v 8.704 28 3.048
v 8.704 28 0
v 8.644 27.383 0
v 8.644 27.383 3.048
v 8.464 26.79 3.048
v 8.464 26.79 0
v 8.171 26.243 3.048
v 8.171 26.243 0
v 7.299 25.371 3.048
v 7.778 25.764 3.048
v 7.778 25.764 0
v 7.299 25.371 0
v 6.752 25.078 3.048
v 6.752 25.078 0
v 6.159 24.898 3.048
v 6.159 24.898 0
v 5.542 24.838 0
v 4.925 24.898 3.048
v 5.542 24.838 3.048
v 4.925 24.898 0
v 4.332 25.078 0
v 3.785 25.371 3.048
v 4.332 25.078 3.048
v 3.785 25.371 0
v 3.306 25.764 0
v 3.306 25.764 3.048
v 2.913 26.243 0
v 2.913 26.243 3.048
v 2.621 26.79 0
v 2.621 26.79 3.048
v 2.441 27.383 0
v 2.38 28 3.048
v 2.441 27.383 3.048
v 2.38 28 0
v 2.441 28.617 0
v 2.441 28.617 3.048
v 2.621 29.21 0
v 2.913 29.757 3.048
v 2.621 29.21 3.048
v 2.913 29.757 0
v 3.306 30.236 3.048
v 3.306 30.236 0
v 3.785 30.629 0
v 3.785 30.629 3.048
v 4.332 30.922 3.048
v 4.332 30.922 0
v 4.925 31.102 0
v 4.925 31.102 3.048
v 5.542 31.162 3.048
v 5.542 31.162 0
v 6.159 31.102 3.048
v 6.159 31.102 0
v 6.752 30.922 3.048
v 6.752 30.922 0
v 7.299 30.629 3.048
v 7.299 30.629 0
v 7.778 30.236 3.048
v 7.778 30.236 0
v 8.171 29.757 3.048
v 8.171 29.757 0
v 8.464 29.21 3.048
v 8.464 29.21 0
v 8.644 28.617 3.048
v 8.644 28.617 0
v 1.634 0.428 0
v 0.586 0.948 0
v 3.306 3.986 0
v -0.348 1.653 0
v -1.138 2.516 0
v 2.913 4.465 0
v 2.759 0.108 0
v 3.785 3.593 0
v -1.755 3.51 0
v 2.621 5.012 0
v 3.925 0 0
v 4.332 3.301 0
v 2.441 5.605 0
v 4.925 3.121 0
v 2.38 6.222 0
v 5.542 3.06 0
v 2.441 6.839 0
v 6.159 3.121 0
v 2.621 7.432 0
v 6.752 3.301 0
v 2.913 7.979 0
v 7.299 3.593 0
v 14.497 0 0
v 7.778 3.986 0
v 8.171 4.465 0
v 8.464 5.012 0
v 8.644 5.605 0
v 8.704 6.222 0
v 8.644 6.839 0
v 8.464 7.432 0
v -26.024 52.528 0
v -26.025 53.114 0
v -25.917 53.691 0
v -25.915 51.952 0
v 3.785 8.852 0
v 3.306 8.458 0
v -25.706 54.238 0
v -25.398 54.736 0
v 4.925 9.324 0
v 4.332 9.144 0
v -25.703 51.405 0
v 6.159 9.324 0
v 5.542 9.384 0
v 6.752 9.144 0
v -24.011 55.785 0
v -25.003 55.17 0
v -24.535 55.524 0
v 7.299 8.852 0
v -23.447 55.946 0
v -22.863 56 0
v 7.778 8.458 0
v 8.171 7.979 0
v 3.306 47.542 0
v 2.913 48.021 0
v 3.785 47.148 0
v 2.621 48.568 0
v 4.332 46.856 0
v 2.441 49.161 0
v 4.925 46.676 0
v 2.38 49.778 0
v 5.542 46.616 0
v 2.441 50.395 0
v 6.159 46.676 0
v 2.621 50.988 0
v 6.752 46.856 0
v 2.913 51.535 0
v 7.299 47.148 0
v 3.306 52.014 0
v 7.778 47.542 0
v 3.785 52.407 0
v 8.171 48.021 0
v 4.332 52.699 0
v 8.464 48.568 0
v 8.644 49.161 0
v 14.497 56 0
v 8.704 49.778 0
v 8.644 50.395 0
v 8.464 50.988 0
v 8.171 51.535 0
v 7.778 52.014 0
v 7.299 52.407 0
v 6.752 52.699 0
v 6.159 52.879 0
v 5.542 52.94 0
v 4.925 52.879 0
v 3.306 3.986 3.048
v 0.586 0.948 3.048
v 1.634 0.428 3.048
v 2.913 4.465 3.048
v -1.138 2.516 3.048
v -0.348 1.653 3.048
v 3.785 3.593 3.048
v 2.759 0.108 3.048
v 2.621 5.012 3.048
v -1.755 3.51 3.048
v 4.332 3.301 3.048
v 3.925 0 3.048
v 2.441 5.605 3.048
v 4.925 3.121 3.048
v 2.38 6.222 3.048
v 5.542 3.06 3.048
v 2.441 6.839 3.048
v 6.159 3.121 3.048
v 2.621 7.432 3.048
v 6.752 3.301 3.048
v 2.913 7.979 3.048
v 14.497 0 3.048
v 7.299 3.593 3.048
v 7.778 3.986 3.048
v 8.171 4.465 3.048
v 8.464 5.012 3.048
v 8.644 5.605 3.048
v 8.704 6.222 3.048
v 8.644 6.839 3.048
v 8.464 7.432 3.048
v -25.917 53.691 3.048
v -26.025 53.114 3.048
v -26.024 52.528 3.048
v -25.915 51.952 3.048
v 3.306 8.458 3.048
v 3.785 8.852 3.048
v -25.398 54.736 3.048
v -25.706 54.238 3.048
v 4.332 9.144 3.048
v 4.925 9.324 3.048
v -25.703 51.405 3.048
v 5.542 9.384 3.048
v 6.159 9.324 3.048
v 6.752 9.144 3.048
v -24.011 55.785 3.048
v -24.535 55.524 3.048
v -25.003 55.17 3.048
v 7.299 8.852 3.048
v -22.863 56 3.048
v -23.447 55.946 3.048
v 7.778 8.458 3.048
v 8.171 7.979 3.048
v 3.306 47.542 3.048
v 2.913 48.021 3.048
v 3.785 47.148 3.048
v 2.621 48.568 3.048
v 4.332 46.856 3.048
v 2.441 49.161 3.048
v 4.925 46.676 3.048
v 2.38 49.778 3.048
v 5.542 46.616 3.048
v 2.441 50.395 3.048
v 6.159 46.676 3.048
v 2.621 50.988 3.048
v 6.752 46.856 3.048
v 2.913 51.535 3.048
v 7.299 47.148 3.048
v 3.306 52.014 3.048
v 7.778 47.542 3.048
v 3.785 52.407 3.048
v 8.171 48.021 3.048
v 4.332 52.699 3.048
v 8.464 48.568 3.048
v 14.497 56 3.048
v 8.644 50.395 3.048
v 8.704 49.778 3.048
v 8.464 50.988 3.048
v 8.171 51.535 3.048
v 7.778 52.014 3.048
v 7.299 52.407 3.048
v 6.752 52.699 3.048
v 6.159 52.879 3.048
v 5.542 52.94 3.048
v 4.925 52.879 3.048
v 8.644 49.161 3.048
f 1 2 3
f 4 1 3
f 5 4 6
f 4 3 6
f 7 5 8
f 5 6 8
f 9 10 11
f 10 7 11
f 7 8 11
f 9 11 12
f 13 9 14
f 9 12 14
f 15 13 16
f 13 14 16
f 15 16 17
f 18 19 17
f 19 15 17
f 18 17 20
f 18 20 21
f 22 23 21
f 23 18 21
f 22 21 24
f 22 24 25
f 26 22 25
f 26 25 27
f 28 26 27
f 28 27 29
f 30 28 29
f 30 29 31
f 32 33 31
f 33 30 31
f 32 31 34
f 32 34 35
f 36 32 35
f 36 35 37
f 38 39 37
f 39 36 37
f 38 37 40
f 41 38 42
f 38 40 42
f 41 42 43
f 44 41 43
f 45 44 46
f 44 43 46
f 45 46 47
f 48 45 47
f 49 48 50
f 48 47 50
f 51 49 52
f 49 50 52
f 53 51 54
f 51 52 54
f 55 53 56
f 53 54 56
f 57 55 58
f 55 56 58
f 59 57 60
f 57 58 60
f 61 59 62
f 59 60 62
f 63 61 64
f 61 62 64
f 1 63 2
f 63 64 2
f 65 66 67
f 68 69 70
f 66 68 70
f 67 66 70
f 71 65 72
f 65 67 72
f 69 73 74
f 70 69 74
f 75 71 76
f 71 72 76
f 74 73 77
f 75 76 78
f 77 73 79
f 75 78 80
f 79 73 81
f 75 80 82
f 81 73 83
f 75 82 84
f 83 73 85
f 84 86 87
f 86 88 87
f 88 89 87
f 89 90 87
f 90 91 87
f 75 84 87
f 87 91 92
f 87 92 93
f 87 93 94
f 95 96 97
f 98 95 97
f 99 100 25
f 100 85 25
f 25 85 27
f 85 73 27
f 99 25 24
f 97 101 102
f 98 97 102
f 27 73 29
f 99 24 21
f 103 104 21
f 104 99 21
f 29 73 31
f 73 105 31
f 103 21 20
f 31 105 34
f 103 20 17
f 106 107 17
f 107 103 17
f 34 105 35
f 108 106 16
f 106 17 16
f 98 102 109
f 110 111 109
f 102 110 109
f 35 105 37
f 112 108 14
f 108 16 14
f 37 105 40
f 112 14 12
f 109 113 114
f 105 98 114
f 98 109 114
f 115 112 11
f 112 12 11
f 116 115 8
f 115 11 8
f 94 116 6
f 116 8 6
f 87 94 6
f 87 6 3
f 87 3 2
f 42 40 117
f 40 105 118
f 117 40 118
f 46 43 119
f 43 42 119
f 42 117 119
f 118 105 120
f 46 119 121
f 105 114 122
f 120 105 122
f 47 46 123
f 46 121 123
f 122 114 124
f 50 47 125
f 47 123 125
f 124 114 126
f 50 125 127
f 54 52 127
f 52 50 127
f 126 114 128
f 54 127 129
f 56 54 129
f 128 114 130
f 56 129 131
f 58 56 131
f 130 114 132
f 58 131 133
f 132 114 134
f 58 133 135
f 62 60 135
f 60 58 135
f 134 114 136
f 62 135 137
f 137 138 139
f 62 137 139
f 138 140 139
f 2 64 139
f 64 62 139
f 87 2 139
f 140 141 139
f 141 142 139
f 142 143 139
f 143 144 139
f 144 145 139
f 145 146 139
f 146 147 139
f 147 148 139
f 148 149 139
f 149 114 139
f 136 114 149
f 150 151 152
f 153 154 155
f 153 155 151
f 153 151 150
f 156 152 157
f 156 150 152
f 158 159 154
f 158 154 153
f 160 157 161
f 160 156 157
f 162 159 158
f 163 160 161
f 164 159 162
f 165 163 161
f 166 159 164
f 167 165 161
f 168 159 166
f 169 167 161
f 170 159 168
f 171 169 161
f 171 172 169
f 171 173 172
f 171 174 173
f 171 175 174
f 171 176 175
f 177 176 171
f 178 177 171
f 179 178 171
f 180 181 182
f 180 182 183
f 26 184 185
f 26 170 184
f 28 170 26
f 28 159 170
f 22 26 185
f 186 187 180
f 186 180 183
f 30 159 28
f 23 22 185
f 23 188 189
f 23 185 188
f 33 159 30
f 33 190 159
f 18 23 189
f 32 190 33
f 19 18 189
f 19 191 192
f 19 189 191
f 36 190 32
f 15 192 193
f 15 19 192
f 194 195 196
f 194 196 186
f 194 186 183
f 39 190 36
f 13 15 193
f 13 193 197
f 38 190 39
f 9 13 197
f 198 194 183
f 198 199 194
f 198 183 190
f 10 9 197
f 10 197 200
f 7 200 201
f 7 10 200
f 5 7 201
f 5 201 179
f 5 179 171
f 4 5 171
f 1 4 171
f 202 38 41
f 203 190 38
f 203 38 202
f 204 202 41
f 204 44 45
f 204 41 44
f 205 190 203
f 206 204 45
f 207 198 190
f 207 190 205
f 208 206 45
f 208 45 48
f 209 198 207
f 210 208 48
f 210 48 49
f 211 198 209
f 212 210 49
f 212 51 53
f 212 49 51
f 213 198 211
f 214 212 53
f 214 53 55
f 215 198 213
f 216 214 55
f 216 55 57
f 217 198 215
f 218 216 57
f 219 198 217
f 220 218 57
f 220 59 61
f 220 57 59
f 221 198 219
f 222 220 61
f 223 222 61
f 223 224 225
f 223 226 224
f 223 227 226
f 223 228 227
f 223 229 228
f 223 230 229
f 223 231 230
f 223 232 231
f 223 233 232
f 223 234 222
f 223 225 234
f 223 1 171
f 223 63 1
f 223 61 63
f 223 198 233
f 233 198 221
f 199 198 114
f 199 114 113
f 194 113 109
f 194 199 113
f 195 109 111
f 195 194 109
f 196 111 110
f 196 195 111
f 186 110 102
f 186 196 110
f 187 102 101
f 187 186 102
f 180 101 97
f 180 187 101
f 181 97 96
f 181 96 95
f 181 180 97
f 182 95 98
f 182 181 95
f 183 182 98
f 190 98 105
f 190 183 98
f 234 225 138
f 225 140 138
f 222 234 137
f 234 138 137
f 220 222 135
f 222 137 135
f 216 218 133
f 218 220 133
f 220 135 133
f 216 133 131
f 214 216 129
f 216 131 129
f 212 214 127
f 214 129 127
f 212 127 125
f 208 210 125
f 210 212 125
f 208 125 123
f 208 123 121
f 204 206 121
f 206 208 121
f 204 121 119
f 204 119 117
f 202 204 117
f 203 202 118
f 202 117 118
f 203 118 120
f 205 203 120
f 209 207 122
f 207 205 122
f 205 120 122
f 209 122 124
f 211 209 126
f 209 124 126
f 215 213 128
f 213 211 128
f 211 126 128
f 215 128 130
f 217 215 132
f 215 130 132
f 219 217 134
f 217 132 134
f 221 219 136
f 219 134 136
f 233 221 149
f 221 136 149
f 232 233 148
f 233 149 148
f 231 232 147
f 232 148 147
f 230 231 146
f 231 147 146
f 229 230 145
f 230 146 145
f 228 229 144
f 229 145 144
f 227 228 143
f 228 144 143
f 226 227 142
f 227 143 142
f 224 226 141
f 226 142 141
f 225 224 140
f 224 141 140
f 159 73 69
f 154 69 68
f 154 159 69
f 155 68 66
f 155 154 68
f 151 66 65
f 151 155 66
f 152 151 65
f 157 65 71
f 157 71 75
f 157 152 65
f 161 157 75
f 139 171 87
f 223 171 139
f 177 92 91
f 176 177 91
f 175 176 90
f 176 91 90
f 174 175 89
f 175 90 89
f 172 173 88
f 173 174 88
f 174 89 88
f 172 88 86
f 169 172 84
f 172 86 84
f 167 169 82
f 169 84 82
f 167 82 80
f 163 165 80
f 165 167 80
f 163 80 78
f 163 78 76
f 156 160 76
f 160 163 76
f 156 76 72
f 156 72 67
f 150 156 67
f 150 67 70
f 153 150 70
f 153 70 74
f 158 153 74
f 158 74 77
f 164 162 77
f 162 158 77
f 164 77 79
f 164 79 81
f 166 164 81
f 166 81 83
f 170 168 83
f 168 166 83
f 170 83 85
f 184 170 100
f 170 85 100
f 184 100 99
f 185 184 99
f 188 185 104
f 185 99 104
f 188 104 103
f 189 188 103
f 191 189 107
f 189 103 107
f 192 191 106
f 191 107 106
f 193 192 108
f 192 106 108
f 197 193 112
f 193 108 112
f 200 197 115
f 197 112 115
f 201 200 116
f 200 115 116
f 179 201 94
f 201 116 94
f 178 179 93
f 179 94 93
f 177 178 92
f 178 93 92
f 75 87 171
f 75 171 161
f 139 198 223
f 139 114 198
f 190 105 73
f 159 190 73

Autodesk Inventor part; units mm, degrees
ref_plane "YZ Plane" through (0, 0, 0) normal (1, 0, 0) x (0, 1, 0)
ref_plane "XZ Plane" through (0, 0, 0) normal (0, 1, 0) x (-1, 0, 0)
ref_plane "XY Plane" through (0, 0, 0) normal (0, 0, 1) x (1, 0, 0)
sketch "Sketch1" plane through (0, 0, 0) normal (0, 0, 1) x (1, 0, 0)
  line L0 (-50.8, 101.6) -> (101.6, 101.6)
  line L1 (50.8, 0) -> (101.6, 101.6)
  line L2 (-28, 56) -> (0, 0)
  line L3 (14.6239, 7) -> (34.6239, 7)
  line L4 (34.6239, 7) -> (34.6239, 2)
  line L5 (34.6239, 2) -> (14.6239, 2)
  line L6 (14.6239, 2) -> (14.6239, 7)
  line L7 (50.8, 0) -> (50.8, 62.4863)
  line L8 (14.6239, 14) -> (34.6239, 14)
  line L9 (34.6239, 14) -> (34.6239, 9)
  line L10 (34.6239, 9) -> (14.6239, 9)
  line L11 (14.6239, 9) -> (14.6239, 14)
  line L12 (14.6239, 21) -> (34.6239, 21)
  line L13 (34.6239, 21) -> (34.6239, 16)
  line L14 (34.6239, 16) -> (14.6239, 16)
  line L15 (14.6239, 16) -> (14.6239, 21)
  line L16 (14.6239, 28) -> (34.6239, 28)
  line L17 (34.6239, 28) -> (34.6239, 23)
  line L18 (34.6239, 23) -> (14.6239, 23)
  line L19 (14.6239, 23) -> (14.6239, 28)
  line L20 (14.6239, 35) -> (34.6239, 35)
  line L21 (34.6239, 35) -> (34.6239, 30)
  line L22 (34.6239, 30) -> (14.6239, 30)
  line L23 (14.6239, 30) -> (14.6239, 35)
  line L24 (14.6239, 42) -> (34.6239, 42)
  line L25 (34.6239, 42) -> (34.6239, 37)
  line L26 (34.6239, 37) -> (14.6239, 37)
  line L27 (14.6239, 37) -> (14.6239, 42)
  circle A0 centre (43.7057, 6.2222) radius 3.1623
  circle A1 centre (43.7057, 28) radius 3.1623
  circle A2 centre (43.7057, 49.7778) radius 3.1623
  line L28 (24.6239, 0) -> (24.6239, -15.6085)
  circle A3 centre (5.5421, 49.7778) radius 3.1623
  circle A4 centre (5.5421, 6.2222) radius 3.1623
  circle A5 centre (5.5421, 28) radius 3.1623
  line L29 (34.6239, 44) -> (14.6239, 44)
  line L30 (14.6239, 44) -> (14.6239, 49)
  line L31 (34.6239, 49) -> (34.6239, 44)
  line L32 (14.6239, 49) -> (34.6239, 49)
  line L33 (34.6239, 51) -> (14.6239, 51)
  line L34 (14.6239, 51) -> (14.6239, 56)
  line L35 (14.6239, 56) -> (34.6239, 56)
  line L36 (34.6239, 56) -> (34.6239, 51)
  circle A6 centre (-34.29, 91.44) radius 3.1623
  circle A7 centre (85.09, 91.44) radius 3.1623
  line L37 (14.6239, 0) -> (-28, 0)
  line L38 (-28, 0) -> (-28, 56)
  line L39 (-28, 56) -> (14.6239, 56)
  line L40 (14.6239, 56) -> (14.6239, 0)
  line L41 (-28, 56) -> (0, 0)
  line L42 (-28, 56) -> (14.6239, 56)
  line L43 (14.6239, 56) -> (14.6239, 0)
  line L44 (14.6239, 0) -> (0, 0)
  line L45 (0, 0) -> (14.6239, 0)
  line L46 (34.6239, 0) -> (50.8, 0)
  dimension "d8" = 50.8
  dimension "d9" = 152.4
  dimension "d11" = 50.8
  dimension "d12" = 20
  dimension "d13" = 5
  dimension "d15" = 7
  dimension "d16" = 6.3246
  dimension "d17" = 6.3246
  dimension "d18" = 6.3246
  dimension "d19" = 14
  dimension "d21" = 6.2222
  dimension "d24" = 6.3246
  dimension "d25" = 6.3246
  dimension "d26" = 34.29
  dimension "d27" = 34.29
  dimension "d28" = 10.16
  dimension "d29" = 10.16
  dimension "d40" = 9.0818
  dimension "d41" = 9.0818
  dimension "d42" = 9.0818
  dimension "d43" = 9.0818
  dimension "d44" = 9.0818
  dimension "d45" = 9.0818
  dimension "d46" = 26.1761
extrude "Plate1" add sketch "Sketch1" along normal blind 3.048 contours L39 L34 L40 L30 L27 L23 L19 L15 L11 L6 L37 L2
sketch "Sketch2" plane through (0, 0, 3.048) normal (0, 0, 1) x (1, 0, 0)
  line L0 (14.6239, 56) -> (14.6239, 0) projected
  line L1 (-28, 56) -> (14.6239, 56) projected
  line L2 (14.6239, 0) -> (14.4969, 0)
  line L3 (14.4969, 0) -> (14.4969, 56)
  line L4 (14.4969, 56) -> (14.6239, 56)
  line L5 (14.6239, 56) -> (14.6239, 0)
  dimension "d33" = 0.127
extrude "Cut1" cut sketch "Sketch2" against normal blind 3.048
fillet "Corner Round1" radius 6.35 1 edges at (0, 0, 1.524)
fillet "Corner Round1" radius 3.175 1 edges at (-28, 56, 1.524)
equation "\"d17\" = d16"
equation "\"d18\" = d17"
equation "\"d21\" = 0.111111 * d20"
equation "\"d27\" = d26"
equation "\"d29\" = d28"
equation "\"d41\" = d40"
equation "\"d42\" = d40"
equation "\"d43\" = d42"
equation "\"d34\" = Thickness"
equation "\"BendRadius\" = Thickness"
equation "\"BendReliefWidth\" = Thickness"
equation "\"BendReliefDepth\" = 0.5 * Thickness"
equation "\"CornerReliefSize\" = 4 * Thickness"
equation "\"MinimumRemnant\" = 2 * Thickness"
equation "\"TransitionRadius\" = BendRadius"
equation "\"JacobiRadiusSize\" = BendRadius"
equation "\"GapSize\" = Thickness"
equation "\"d22\" = d21"
equation "\"d23\" = 0.5 * d20"
equation "\"d32\" = BendRadius"
equation "\"d20\" = 56"
equation "\"Thickness\" = 3.048"
properties part number "Belt plate mid"
